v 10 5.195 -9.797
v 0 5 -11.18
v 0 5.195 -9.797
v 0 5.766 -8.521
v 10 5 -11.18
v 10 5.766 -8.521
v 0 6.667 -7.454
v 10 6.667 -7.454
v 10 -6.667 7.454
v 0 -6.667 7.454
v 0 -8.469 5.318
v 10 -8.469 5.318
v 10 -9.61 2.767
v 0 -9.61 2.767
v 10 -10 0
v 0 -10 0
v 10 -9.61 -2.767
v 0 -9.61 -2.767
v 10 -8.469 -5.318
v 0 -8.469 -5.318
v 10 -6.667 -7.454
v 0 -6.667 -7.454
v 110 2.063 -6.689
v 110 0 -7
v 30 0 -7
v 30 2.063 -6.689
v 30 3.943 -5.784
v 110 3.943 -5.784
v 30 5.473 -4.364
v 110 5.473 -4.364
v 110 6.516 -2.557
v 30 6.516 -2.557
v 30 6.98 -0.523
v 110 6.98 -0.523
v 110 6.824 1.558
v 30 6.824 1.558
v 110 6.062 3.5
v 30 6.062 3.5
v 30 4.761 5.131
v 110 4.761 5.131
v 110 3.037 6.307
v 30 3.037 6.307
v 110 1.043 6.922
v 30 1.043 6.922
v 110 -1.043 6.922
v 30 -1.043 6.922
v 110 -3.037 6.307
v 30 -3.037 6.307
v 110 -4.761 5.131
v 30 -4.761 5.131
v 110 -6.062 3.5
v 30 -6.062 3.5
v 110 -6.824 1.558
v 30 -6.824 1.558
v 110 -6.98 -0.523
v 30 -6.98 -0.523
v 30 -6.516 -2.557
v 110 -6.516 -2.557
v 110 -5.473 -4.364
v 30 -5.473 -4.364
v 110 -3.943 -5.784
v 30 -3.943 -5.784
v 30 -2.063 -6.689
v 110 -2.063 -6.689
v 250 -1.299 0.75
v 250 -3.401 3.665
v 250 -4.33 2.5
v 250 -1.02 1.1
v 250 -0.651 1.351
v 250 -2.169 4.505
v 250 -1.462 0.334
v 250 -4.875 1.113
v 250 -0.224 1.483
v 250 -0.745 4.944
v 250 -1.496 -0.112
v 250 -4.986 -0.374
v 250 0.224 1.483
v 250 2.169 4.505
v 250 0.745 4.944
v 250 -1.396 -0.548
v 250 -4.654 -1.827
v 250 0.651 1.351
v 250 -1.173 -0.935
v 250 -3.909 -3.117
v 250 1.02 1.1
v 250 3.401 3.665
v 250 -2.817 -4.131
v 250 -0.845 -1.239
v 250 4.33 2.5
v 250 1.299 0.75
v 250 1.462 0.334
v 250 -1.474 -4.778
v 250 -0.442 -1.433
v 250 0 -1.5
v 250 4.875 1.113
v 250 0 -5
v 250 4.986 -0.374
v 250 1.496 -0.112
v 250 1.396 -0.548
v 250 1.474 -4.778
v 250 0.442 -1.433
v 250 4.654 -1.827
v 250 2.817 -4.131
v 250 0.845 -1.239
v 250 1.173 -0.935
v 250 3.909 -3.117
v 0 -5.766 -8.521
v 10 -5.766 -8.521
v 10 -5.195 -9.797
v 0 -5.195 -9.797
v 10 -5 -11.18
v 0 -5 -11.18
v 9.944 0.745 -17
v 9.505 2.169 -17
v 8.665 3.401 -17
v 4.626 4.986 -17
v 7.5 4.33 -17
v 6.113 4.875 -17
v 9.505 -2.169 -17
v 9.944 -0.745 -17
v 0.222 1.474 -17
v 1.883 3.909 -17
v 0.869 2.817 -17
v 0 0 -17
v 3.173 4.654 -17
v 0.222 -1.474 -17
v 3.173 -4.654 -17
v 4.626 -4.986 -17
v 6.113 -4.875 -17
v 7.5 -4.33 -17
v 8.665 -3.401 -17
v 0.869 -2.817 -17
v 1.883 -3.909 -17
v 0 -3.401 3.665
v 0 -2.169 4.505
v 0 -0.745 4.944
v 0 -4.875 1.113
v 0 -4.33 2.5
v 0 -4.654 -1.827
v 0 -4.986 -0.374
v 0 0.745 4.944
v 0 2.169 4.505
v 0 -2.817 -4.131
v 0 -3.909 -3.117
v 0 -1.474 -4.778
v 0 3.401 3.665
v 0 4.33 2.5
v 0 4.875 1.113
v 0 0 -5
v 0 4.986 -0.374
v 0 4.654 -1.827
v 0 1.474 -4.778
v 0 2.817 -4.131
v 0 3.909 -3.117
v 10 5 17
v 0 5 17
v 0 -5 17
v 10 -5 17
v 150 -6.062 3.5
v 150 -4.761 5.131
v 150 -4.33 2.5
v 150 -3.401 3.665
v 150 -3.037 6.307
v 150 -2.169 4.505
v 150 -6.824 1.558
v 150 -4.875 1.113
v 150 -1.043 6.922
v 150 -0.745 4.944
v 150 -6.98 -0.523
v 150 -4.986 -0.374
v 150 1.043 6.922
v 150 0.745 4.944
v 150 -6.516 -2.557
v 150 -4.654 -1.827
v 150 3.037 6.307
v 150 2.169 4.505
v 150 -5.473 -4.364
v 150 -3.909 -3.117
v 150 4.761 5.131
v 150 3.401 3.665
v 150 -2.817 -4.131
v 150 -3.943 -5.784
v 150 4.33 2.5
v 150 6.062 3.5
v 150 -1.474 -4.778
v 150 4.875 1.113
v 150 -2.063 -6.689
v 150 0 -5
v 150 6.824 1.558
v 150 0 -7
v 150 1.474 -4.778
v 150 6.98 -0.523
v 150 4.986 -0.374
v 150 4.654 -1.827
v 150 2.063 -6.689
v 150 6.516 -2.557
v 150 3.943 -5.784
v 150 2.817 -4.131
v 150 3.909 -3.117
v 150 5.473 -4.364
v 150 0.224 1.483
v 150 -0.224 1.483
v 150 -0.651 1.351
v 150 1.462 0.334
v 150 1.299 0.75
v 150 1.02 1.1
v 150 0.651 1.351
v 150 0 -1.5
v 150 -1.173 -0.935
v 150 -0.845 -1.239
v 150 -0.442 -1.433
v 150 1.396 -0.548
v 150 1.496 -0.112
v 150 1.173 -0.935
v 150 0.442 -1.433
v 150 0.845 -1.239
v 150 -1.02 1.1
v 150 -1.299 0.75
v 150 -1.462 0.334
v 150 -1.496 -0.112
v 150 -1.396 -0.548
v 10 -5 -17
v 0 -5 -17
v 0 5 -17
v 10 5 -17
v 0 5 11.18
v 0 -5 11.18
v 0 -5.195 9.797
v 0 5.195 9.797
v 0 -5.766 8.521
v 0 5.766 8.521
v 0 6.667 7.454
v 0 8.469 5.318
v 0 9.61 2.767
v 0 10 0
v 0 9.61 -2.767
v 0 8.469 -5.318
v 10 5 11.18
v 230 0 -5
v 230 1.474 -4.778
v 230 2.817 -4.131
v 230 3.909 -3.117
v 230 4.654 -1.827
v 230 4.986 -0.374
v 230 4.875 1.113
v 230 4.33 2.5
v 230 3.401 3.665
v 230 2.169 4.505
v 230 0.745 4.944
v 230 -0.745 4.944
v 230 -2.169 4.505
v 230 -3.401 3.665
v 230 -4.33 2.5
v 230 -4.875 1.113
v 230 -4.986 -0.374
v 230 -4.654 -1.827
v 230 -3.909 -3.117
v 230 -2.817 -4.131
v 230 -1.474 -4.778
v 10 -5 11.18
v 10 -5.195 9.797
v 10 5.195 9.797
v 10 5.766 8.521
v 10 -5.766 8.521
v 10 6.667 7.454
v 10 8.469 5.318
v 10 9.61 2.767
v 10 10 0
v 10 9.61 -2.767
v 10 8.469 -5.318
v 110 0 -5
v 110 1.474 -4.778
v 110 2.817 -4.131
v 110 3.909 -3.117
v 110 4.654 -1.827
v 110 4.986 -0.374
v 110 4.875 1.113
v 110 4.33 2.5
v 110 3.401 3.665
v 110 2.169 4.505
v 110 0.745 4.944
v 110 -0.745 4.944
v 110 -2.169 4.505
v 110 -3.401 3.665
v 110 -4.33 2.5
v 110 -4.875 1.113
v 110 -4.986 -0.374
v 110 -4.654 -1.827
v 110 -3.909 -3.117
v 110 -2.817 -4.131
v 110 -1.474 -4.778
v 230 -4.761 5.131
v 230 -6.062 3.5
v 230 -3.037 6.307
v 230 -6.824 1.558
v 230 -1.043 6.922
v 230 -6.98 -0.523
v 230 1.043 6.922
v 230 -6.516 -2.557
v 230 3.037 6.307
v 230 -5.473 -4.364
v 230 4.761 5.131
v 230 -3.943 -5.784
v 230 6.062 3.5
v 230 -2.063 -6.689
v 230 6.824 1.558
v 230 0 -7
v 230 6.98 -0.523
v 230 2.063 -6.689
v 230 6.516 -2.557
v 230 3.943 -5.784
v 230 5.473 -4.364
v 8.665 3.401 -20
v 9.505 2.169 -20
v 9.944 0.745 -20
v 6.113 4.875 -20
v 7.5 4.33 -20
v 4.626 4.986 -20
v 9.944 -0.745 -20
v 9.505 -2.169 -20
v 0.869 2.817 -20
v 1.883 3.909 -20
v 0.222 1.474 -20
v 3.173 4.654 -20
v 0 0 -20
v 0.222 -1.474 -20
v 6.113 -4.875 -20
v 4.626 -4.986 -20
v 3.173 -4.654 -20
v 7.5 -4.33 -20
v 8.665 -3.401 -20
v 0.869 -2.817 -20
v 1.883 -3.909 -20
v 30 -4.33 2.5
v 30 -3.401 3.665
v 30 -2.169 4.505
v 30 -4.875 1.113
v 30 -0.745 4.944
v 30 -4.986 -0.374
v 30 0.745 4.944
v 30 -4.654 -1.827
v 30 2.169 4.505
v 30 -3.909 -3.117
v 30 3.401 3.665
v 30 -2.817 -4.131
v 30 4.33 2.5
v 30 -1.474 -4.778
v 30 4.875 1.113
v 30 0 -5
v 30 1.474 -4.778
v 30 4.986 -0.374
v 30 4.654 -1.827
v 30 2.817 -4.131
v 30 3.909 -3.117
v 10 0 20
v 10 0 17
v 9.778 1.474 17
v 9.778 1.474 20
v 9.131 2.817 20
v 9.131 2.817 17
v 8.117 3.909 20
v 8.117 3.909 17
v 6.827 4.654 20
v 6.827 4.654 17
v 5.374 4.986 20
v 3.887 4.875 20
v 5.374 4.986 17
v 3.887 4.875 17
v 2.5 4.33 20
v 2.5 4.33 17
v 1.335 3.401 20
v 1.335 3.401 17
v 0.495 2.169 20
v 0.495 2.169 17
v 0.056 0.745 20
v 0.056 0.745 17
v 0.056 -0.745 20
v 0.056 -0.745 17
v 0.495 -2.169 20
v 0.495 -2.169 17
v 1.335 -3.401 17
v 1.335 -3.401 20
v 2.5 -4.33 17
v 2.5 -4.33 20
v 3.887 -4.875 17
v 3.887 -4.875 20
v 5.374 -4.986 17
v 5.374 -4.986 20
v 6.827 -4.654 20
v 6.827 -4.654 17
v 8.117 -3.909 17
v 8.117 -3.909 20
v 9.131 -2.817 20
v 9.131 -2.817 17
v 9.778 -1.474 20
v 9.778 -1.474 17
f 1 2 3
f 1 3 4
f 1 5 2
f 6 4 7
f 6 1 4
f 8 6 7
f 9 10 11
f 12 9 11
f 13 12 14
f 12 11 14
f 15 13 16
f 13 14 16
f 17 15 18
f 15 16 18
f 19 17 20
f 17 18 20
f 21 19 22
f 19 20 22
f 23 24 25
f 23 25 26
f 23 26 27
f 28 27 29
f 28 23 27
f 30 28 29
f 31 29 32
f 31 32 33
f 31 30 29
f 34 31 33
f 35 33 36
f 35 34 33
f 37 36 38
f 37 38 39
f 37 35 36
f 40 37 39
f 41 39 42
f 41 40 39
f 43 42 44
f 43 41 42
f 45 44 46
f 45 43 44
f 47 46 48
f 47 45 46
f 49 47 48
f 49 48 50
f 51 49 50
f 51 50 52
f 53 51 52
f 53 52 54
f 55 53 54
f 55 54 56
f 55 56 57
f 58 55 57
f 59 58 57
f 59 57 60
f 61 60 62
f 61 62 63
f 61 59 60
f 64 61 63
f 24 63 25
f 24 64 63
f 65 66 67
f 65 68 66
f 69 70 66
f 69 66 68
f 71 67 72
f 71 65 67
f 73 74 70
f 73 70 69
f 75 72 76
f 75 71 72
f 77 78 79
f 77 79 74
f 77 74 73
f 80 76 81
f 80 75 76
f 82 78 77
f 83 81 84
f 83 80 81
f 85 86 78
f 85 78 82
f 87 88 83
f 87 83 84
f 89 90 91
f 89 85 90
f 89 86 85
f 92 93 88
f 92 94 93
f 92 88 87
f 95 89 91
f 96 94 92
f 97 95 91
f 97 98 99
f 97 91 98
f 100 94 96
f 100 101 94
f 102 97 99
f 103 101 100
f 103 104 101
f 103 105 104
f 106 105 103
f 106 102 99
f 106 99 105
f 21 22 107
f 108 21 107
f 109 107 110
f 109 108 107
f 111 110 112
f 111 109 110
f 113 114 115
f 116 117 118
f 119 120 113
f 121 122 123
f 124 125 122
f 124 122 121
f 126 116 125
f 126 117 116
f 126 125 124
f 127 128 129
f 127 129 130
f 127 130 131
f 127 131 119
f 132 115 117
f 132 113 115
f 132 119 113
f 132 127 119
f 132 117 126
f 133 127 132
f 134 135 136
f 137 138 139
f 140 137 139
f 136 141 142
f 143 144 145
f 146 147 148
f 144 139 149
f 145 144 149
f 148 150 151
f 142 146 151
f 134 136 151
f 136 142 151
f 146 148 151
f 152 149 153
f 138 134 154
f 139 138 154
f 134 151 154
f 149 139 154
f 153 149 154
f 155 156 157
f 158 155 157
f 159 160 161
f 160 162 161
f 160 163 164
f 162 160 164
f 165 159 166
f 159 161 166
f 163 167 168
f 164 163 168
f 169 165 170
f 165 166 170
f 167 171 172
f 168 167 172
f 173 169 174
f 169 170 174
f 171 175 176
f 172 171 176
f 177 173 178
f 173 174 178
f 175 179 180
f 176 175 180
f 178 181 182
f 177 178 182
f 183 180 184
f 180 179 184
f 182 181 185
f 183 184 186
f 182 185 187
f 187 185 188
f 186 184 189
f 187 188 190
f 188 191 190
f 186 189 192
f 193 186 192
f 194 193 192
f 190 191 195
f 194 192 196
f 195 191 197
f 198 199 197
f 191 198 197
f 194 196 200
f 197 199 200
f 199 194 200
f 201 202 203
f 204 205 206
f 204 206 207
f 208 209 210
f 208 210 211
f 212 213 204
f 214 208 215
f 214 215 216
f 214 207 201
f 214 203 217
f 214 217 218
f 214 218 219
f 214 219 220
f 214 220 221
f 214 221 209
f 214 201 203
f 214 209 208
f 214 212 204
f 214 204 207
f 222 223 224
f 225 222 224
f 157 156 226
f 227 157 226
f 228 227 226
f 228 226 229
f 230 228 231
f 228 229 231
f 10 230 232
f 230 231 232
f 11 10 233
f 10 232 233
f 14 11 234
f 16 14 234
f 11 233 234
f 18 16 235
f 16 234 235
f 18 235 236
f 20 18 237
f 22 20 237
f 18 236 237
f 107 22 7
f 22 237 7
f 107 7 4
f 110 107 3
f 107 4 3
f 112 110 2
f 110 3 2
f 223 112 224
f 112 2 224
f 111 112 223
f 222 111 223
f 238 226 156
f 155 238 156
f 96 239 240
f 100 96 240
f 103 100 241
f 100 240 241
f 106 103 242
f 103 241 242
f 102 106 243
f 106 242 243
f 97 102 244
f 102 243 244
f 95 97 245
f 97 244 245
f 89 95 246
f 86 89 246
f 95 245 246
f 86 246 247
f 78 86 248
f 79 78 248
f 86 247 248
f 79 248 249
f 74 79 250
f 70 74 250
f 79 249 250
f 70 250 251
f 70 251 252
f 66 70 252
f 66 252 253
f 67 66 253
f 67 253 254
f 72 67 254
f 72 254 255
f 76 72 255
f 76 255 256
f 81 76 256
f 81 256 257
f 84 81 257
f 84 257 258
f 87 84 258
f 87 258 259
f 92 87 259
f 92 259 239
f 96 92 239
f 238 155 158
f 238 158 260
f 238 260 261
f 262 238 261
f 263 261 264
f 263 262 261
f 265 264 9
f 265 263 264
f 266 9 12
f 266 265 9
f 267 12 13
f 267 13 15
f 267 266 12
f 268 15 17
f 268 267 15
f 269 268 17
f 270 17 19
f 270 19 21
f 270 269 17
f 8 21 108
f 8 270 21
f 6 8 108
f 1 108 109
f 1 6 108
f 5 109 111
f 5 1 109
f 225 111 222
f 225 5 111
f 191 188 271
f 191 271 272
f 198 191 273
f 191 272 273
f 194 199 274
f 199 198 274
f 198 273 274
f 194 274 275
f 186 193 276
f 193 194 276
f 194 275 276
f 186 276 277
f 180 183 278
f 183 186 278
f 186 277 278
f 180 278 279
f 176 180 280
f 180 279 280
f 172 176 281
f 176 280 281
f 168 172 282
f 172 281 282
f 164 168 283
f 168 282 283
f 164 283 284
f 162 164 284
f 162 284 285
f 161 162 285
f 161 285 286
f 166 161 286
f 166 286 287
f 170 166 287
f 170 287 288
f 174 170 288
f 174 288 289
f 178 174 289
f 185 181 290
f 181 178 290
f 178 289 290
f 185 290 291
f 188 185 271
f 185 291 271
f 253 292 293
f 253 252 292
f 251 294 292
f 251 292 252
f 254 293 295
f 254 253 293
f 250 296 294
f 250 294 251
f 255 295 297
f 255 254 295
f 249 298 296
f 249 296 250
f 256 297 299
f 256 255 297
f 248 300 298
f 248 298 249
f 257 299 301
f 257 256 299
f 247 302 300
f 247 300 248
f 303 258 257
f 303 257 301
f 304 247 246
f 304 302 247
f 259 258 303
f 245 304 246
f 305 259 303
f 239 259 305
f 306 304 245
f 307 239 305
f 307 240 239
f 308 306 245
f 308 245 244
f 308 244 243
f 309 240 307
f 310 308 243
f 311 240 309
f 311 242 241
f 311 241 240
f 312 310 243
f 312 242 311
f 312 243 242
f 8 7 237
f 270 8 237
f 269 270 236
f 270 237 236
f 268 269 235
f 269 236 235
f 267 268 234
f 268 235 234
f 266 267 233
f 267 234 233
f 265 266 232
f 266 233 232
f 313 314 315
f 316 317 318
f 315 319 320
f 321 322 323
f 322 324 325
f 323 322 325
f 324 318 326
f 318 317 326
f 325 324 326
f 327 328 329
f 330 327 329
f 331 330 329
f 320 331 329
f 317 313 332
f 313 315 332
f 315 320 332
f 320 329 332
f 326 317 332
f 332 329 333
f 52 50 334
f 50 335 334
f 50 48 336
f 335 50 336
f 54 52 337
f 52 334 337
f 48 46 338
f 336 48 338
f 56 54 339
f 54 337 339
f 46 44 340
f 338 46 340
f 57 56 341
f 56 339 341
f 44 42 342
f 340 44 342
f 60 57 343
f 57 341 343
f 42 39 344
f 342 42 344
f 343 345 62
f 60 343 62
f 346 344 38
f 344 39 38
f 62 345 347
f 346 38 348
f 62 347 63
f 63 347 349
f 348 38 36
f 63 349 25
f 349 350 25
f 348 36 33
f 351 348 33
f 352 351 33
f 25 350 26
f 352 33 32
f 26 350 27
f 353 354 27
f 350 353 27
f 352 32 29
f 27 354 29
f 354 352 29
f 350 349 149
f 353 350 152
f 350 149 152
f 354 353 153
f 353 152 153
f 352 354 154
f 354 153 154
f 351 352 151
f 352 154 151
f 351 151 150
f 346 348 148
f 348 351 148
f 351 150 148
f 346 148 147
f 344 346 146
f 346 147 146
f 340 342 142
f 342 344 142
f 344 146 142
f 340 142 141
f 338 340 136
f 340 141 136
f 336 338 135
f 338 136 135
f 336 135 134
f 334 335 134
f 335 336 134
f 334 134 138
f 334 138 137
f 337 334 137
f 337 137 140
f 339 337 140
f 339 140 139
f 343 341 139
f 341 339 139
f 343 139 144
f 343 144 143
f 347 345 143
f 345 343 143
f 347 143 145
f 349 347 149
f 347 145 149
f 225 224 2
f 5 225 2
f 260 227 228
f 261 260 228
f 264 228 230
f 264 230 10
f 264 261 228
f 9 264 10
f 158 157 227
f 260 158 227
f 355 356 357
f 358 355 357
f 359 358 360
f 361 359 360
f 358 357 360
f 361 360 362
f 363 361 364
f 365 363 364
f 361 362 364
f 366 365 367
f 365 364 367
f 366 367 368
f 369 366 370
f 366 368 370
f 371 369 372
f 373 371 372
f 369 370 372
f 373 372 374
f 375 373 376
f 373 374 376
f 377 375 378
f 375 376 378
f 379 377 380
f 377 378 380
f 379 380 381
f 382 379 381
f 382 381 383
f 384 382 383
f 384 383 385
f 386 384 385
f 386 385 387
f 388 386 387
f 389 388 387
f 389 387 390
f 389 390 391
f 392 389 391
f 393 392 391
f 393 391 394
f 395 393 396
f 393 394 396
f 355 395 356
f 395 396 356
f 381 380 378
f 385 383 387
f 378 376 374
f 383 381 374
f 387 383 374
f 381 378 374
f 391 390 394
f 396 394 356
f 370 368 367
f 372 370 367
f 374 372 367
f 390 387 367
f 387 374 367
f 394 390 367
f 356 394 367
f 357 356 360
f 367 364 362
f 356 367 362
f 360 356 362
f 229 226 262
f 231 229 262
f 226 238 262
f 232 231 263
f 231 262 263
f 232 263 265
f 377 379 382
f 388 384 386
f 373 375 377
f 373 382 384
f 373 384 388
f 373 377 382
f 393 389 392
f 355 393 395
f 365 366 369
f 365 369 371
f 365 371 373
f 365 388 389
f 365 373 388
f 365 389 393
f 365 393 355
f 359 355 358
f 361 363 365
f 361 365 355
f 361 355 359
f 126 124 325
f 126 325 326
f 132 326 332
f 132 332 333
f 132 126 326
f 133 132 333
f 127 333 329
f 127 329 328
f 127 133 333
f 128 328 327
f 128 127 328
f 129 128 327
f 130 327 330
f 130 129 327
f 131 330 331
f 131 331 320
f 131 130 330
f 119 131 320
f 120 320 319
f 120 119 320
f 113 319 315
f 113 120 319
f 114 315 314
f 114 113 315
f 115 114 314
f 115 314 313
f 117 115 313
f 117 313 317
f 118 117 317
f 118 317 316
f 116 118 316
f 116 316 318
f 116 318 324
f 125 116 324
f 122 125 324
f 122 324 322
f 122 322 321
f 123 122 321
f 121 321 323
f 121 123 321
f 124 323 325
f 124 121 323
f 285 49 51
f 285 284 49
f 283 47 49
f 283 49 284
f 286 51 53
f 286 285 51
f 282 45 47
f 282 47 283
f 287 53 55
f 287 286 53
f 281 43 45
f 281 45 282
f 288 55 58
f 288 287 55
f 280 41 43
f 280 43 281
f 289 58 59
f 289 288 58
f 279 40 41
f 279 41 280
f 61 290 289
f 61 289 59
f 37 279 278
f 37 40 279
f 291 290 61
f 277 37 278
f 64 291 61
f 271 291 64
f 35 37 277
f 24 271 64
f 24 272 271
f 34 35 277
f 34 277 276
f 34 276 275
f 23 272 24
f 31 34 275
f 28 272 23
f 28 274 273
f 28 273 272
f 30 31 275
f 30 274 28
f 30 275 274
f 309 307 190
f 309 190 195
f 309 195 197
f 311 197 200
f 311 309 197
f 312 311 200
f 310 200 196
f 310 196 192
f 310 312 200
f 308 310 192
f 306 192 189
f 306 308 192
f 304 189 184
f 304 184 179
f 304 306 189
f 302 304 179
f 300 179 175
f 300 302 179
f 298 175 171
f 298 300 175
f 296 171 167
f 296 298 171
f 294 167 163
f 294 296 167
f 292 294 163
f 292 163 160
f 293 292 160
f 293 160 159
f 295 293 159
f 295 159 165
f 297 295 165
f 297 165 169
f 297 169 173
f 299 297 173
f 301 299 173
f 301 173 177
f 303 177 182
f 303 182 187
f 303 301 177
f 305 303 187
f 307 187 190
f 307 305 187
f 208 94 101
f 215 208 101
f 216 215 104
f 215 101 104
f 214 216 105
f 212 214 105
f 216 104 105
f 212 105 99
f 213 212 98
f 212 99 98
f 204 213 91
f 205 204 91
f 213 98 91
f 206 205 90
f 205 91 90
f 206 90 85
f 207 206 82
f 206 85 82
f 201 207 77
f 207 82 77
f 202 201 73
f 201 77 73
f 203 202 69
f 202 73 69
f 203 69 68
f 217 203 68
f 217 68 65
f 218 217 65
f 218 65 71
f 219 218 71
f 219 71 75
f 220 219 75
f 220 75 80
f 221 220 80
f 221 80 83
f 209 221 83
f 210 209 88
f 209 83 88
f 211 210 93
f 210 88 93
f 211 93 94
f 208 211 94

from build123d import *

# Parameters (mm, degrees)
PRIMARY_TUBE_SKETCH_R      = 5
PRIMARY_TUBE_EXTRUDE_DEPTH = 250
THICK_START                = -20
THICK_TUBE_SKETCH_R        = 7
THICK_TUBE_EXTRUDE_1_DEPTH = 80
THICK_START_2              = -140
SKETCH1_2_R                = 7
THICK_TUBE_EXTRUDE_2_DEPTH = 80
PLUNGER_SKETCH_R           = 1.5
PLUNGER_CUT_DEPTH          = 100
T_SUPPORT_EXTRUDE_DEPTH    = 10
T_SUPPORT_FILLET_R         = 5
ARM_PIN_SKETCH_R           = 5
ARM_PIN_EXTRUDE_1_DEPTH    = 3
ARM_START                  = -34
ARM_PIN_SKETCH_2_R         = 5
ARM_PIN_EXTRUDE_2_DEPTH    = 3


with BuildPart() as part:
    # Primary Tube Sketch → Primary Tube Extrude (new body)
    with BuildSketch(Plane(origin=(0, 0, 0), x_dir=(0, 0, -1), z_dir=(1, 0, 0))):
        Circle(PRIMARY_TUBE_SKETCH_R)
    extrude(amount=PRIMARY_TUBE_EXTRUDE_DEPTH)

    # Thick Tube Sketch → Thick Tube Extrude 1 (add)
    with BuildSketch(Plane(origin=(250, 0, 0), x_dir=(0, 0, -1), z_dir=(1, 0, 0)).offset(THICK_START)):
        Circle(THICK_TUBE_SKETCH_R)
    extrude(amount=-THICK_TUBE_EXTRUDE_1_DEPTH)

    # Sketch1<2> → Thick Tube Extrude 2 (add)
    with BuildSketch(Plane(origin=(250, 0, 0), x_dir=(0, 0, -1), z_dir=(1, 0, 0)).offset(THICK_START_2)):
        Circle(SKETCH1_2_R)
    extrude(amount=-THICK_TUBE_EXTRUDE_2_DEPTH)

    # Plunger Sketch → Plunger Cut (cut)
    with BuildSketch(Plane(origin=(250, 0, 0), x_dir=(0, 0, -1), z_dir=(1, 0, 0))):
        Circle(PLUNGER_SKETCH_R)
    extrude(amount=-PLUNGER_CUT_DEPTH, mode=Mode.SUBTRACT)


with BuildPart() as body_2:
    # T Support Sketch → T Support Extrude (new body)
    with BuildSketch(Plane.ZY):
        with BuildLine():
            Line((8.660254038, 5), (17, 5))
            Line((17, 5), (17, -5))
            Line((17, -5), (8.660254038, -5))
            ThreePointArc((8.660254038, -5), (0, -10), (-8.660254038, -5))
            Line((-8.660254038, -5), (-17, -5))
            Line((-17, -5), (-17, 5))
            Line((-17, 5), (-8.660254038, 5))
            ThreePointArc((-8.660254038, 5), (0, 10), (8.660254038, 5))
        make_face()
    extrude(amount=-T_SUPPORT_EXTRUDE_DEPTH)

    # T Support Fillet
    t_support_fillet_edges = [body_2.edges().sort_by_distance(p)[0] for p in [
        (5, -5, 8.660254038),
        (5, -5, -8.660254038),
        (5, 5, -8.660254038),
        (5, 5, 8.660254038),
    ]]
    fillet(t_support_fillet_edges, radius=T_SUPPORT_FILLET_R)


with BuildPart() as body_3:
    # Arm Pin Sketch → Arm Pin Extrude 1 (new body)
    with BuildSketch(Plane.XY.offset(17)):
        with Locations((5, 0)):
            Circle(ARM_PIN_SKETCH_R)
    extrude(amount=ARM_PIN_EXTRUDE_1_DEPTH)


with BuildPart() as body_4:
    # Arm Pin Sketch<2> → Arm Pin Extrude 2 (new body)
    with BuildSketch(Plane.XY.offset(17).offset(ARM_START)):
        with Locations(Location((5, 0, 0), (0, 0, 180))):
            Circle(ARM_PIN_SKETCH_2_R)
    extrude(amount=-ARM_PIN_EXTRUDE_2_DEPTH)


solid = Compound([part.part, body_2.part, body_3.part, body_4.part])
